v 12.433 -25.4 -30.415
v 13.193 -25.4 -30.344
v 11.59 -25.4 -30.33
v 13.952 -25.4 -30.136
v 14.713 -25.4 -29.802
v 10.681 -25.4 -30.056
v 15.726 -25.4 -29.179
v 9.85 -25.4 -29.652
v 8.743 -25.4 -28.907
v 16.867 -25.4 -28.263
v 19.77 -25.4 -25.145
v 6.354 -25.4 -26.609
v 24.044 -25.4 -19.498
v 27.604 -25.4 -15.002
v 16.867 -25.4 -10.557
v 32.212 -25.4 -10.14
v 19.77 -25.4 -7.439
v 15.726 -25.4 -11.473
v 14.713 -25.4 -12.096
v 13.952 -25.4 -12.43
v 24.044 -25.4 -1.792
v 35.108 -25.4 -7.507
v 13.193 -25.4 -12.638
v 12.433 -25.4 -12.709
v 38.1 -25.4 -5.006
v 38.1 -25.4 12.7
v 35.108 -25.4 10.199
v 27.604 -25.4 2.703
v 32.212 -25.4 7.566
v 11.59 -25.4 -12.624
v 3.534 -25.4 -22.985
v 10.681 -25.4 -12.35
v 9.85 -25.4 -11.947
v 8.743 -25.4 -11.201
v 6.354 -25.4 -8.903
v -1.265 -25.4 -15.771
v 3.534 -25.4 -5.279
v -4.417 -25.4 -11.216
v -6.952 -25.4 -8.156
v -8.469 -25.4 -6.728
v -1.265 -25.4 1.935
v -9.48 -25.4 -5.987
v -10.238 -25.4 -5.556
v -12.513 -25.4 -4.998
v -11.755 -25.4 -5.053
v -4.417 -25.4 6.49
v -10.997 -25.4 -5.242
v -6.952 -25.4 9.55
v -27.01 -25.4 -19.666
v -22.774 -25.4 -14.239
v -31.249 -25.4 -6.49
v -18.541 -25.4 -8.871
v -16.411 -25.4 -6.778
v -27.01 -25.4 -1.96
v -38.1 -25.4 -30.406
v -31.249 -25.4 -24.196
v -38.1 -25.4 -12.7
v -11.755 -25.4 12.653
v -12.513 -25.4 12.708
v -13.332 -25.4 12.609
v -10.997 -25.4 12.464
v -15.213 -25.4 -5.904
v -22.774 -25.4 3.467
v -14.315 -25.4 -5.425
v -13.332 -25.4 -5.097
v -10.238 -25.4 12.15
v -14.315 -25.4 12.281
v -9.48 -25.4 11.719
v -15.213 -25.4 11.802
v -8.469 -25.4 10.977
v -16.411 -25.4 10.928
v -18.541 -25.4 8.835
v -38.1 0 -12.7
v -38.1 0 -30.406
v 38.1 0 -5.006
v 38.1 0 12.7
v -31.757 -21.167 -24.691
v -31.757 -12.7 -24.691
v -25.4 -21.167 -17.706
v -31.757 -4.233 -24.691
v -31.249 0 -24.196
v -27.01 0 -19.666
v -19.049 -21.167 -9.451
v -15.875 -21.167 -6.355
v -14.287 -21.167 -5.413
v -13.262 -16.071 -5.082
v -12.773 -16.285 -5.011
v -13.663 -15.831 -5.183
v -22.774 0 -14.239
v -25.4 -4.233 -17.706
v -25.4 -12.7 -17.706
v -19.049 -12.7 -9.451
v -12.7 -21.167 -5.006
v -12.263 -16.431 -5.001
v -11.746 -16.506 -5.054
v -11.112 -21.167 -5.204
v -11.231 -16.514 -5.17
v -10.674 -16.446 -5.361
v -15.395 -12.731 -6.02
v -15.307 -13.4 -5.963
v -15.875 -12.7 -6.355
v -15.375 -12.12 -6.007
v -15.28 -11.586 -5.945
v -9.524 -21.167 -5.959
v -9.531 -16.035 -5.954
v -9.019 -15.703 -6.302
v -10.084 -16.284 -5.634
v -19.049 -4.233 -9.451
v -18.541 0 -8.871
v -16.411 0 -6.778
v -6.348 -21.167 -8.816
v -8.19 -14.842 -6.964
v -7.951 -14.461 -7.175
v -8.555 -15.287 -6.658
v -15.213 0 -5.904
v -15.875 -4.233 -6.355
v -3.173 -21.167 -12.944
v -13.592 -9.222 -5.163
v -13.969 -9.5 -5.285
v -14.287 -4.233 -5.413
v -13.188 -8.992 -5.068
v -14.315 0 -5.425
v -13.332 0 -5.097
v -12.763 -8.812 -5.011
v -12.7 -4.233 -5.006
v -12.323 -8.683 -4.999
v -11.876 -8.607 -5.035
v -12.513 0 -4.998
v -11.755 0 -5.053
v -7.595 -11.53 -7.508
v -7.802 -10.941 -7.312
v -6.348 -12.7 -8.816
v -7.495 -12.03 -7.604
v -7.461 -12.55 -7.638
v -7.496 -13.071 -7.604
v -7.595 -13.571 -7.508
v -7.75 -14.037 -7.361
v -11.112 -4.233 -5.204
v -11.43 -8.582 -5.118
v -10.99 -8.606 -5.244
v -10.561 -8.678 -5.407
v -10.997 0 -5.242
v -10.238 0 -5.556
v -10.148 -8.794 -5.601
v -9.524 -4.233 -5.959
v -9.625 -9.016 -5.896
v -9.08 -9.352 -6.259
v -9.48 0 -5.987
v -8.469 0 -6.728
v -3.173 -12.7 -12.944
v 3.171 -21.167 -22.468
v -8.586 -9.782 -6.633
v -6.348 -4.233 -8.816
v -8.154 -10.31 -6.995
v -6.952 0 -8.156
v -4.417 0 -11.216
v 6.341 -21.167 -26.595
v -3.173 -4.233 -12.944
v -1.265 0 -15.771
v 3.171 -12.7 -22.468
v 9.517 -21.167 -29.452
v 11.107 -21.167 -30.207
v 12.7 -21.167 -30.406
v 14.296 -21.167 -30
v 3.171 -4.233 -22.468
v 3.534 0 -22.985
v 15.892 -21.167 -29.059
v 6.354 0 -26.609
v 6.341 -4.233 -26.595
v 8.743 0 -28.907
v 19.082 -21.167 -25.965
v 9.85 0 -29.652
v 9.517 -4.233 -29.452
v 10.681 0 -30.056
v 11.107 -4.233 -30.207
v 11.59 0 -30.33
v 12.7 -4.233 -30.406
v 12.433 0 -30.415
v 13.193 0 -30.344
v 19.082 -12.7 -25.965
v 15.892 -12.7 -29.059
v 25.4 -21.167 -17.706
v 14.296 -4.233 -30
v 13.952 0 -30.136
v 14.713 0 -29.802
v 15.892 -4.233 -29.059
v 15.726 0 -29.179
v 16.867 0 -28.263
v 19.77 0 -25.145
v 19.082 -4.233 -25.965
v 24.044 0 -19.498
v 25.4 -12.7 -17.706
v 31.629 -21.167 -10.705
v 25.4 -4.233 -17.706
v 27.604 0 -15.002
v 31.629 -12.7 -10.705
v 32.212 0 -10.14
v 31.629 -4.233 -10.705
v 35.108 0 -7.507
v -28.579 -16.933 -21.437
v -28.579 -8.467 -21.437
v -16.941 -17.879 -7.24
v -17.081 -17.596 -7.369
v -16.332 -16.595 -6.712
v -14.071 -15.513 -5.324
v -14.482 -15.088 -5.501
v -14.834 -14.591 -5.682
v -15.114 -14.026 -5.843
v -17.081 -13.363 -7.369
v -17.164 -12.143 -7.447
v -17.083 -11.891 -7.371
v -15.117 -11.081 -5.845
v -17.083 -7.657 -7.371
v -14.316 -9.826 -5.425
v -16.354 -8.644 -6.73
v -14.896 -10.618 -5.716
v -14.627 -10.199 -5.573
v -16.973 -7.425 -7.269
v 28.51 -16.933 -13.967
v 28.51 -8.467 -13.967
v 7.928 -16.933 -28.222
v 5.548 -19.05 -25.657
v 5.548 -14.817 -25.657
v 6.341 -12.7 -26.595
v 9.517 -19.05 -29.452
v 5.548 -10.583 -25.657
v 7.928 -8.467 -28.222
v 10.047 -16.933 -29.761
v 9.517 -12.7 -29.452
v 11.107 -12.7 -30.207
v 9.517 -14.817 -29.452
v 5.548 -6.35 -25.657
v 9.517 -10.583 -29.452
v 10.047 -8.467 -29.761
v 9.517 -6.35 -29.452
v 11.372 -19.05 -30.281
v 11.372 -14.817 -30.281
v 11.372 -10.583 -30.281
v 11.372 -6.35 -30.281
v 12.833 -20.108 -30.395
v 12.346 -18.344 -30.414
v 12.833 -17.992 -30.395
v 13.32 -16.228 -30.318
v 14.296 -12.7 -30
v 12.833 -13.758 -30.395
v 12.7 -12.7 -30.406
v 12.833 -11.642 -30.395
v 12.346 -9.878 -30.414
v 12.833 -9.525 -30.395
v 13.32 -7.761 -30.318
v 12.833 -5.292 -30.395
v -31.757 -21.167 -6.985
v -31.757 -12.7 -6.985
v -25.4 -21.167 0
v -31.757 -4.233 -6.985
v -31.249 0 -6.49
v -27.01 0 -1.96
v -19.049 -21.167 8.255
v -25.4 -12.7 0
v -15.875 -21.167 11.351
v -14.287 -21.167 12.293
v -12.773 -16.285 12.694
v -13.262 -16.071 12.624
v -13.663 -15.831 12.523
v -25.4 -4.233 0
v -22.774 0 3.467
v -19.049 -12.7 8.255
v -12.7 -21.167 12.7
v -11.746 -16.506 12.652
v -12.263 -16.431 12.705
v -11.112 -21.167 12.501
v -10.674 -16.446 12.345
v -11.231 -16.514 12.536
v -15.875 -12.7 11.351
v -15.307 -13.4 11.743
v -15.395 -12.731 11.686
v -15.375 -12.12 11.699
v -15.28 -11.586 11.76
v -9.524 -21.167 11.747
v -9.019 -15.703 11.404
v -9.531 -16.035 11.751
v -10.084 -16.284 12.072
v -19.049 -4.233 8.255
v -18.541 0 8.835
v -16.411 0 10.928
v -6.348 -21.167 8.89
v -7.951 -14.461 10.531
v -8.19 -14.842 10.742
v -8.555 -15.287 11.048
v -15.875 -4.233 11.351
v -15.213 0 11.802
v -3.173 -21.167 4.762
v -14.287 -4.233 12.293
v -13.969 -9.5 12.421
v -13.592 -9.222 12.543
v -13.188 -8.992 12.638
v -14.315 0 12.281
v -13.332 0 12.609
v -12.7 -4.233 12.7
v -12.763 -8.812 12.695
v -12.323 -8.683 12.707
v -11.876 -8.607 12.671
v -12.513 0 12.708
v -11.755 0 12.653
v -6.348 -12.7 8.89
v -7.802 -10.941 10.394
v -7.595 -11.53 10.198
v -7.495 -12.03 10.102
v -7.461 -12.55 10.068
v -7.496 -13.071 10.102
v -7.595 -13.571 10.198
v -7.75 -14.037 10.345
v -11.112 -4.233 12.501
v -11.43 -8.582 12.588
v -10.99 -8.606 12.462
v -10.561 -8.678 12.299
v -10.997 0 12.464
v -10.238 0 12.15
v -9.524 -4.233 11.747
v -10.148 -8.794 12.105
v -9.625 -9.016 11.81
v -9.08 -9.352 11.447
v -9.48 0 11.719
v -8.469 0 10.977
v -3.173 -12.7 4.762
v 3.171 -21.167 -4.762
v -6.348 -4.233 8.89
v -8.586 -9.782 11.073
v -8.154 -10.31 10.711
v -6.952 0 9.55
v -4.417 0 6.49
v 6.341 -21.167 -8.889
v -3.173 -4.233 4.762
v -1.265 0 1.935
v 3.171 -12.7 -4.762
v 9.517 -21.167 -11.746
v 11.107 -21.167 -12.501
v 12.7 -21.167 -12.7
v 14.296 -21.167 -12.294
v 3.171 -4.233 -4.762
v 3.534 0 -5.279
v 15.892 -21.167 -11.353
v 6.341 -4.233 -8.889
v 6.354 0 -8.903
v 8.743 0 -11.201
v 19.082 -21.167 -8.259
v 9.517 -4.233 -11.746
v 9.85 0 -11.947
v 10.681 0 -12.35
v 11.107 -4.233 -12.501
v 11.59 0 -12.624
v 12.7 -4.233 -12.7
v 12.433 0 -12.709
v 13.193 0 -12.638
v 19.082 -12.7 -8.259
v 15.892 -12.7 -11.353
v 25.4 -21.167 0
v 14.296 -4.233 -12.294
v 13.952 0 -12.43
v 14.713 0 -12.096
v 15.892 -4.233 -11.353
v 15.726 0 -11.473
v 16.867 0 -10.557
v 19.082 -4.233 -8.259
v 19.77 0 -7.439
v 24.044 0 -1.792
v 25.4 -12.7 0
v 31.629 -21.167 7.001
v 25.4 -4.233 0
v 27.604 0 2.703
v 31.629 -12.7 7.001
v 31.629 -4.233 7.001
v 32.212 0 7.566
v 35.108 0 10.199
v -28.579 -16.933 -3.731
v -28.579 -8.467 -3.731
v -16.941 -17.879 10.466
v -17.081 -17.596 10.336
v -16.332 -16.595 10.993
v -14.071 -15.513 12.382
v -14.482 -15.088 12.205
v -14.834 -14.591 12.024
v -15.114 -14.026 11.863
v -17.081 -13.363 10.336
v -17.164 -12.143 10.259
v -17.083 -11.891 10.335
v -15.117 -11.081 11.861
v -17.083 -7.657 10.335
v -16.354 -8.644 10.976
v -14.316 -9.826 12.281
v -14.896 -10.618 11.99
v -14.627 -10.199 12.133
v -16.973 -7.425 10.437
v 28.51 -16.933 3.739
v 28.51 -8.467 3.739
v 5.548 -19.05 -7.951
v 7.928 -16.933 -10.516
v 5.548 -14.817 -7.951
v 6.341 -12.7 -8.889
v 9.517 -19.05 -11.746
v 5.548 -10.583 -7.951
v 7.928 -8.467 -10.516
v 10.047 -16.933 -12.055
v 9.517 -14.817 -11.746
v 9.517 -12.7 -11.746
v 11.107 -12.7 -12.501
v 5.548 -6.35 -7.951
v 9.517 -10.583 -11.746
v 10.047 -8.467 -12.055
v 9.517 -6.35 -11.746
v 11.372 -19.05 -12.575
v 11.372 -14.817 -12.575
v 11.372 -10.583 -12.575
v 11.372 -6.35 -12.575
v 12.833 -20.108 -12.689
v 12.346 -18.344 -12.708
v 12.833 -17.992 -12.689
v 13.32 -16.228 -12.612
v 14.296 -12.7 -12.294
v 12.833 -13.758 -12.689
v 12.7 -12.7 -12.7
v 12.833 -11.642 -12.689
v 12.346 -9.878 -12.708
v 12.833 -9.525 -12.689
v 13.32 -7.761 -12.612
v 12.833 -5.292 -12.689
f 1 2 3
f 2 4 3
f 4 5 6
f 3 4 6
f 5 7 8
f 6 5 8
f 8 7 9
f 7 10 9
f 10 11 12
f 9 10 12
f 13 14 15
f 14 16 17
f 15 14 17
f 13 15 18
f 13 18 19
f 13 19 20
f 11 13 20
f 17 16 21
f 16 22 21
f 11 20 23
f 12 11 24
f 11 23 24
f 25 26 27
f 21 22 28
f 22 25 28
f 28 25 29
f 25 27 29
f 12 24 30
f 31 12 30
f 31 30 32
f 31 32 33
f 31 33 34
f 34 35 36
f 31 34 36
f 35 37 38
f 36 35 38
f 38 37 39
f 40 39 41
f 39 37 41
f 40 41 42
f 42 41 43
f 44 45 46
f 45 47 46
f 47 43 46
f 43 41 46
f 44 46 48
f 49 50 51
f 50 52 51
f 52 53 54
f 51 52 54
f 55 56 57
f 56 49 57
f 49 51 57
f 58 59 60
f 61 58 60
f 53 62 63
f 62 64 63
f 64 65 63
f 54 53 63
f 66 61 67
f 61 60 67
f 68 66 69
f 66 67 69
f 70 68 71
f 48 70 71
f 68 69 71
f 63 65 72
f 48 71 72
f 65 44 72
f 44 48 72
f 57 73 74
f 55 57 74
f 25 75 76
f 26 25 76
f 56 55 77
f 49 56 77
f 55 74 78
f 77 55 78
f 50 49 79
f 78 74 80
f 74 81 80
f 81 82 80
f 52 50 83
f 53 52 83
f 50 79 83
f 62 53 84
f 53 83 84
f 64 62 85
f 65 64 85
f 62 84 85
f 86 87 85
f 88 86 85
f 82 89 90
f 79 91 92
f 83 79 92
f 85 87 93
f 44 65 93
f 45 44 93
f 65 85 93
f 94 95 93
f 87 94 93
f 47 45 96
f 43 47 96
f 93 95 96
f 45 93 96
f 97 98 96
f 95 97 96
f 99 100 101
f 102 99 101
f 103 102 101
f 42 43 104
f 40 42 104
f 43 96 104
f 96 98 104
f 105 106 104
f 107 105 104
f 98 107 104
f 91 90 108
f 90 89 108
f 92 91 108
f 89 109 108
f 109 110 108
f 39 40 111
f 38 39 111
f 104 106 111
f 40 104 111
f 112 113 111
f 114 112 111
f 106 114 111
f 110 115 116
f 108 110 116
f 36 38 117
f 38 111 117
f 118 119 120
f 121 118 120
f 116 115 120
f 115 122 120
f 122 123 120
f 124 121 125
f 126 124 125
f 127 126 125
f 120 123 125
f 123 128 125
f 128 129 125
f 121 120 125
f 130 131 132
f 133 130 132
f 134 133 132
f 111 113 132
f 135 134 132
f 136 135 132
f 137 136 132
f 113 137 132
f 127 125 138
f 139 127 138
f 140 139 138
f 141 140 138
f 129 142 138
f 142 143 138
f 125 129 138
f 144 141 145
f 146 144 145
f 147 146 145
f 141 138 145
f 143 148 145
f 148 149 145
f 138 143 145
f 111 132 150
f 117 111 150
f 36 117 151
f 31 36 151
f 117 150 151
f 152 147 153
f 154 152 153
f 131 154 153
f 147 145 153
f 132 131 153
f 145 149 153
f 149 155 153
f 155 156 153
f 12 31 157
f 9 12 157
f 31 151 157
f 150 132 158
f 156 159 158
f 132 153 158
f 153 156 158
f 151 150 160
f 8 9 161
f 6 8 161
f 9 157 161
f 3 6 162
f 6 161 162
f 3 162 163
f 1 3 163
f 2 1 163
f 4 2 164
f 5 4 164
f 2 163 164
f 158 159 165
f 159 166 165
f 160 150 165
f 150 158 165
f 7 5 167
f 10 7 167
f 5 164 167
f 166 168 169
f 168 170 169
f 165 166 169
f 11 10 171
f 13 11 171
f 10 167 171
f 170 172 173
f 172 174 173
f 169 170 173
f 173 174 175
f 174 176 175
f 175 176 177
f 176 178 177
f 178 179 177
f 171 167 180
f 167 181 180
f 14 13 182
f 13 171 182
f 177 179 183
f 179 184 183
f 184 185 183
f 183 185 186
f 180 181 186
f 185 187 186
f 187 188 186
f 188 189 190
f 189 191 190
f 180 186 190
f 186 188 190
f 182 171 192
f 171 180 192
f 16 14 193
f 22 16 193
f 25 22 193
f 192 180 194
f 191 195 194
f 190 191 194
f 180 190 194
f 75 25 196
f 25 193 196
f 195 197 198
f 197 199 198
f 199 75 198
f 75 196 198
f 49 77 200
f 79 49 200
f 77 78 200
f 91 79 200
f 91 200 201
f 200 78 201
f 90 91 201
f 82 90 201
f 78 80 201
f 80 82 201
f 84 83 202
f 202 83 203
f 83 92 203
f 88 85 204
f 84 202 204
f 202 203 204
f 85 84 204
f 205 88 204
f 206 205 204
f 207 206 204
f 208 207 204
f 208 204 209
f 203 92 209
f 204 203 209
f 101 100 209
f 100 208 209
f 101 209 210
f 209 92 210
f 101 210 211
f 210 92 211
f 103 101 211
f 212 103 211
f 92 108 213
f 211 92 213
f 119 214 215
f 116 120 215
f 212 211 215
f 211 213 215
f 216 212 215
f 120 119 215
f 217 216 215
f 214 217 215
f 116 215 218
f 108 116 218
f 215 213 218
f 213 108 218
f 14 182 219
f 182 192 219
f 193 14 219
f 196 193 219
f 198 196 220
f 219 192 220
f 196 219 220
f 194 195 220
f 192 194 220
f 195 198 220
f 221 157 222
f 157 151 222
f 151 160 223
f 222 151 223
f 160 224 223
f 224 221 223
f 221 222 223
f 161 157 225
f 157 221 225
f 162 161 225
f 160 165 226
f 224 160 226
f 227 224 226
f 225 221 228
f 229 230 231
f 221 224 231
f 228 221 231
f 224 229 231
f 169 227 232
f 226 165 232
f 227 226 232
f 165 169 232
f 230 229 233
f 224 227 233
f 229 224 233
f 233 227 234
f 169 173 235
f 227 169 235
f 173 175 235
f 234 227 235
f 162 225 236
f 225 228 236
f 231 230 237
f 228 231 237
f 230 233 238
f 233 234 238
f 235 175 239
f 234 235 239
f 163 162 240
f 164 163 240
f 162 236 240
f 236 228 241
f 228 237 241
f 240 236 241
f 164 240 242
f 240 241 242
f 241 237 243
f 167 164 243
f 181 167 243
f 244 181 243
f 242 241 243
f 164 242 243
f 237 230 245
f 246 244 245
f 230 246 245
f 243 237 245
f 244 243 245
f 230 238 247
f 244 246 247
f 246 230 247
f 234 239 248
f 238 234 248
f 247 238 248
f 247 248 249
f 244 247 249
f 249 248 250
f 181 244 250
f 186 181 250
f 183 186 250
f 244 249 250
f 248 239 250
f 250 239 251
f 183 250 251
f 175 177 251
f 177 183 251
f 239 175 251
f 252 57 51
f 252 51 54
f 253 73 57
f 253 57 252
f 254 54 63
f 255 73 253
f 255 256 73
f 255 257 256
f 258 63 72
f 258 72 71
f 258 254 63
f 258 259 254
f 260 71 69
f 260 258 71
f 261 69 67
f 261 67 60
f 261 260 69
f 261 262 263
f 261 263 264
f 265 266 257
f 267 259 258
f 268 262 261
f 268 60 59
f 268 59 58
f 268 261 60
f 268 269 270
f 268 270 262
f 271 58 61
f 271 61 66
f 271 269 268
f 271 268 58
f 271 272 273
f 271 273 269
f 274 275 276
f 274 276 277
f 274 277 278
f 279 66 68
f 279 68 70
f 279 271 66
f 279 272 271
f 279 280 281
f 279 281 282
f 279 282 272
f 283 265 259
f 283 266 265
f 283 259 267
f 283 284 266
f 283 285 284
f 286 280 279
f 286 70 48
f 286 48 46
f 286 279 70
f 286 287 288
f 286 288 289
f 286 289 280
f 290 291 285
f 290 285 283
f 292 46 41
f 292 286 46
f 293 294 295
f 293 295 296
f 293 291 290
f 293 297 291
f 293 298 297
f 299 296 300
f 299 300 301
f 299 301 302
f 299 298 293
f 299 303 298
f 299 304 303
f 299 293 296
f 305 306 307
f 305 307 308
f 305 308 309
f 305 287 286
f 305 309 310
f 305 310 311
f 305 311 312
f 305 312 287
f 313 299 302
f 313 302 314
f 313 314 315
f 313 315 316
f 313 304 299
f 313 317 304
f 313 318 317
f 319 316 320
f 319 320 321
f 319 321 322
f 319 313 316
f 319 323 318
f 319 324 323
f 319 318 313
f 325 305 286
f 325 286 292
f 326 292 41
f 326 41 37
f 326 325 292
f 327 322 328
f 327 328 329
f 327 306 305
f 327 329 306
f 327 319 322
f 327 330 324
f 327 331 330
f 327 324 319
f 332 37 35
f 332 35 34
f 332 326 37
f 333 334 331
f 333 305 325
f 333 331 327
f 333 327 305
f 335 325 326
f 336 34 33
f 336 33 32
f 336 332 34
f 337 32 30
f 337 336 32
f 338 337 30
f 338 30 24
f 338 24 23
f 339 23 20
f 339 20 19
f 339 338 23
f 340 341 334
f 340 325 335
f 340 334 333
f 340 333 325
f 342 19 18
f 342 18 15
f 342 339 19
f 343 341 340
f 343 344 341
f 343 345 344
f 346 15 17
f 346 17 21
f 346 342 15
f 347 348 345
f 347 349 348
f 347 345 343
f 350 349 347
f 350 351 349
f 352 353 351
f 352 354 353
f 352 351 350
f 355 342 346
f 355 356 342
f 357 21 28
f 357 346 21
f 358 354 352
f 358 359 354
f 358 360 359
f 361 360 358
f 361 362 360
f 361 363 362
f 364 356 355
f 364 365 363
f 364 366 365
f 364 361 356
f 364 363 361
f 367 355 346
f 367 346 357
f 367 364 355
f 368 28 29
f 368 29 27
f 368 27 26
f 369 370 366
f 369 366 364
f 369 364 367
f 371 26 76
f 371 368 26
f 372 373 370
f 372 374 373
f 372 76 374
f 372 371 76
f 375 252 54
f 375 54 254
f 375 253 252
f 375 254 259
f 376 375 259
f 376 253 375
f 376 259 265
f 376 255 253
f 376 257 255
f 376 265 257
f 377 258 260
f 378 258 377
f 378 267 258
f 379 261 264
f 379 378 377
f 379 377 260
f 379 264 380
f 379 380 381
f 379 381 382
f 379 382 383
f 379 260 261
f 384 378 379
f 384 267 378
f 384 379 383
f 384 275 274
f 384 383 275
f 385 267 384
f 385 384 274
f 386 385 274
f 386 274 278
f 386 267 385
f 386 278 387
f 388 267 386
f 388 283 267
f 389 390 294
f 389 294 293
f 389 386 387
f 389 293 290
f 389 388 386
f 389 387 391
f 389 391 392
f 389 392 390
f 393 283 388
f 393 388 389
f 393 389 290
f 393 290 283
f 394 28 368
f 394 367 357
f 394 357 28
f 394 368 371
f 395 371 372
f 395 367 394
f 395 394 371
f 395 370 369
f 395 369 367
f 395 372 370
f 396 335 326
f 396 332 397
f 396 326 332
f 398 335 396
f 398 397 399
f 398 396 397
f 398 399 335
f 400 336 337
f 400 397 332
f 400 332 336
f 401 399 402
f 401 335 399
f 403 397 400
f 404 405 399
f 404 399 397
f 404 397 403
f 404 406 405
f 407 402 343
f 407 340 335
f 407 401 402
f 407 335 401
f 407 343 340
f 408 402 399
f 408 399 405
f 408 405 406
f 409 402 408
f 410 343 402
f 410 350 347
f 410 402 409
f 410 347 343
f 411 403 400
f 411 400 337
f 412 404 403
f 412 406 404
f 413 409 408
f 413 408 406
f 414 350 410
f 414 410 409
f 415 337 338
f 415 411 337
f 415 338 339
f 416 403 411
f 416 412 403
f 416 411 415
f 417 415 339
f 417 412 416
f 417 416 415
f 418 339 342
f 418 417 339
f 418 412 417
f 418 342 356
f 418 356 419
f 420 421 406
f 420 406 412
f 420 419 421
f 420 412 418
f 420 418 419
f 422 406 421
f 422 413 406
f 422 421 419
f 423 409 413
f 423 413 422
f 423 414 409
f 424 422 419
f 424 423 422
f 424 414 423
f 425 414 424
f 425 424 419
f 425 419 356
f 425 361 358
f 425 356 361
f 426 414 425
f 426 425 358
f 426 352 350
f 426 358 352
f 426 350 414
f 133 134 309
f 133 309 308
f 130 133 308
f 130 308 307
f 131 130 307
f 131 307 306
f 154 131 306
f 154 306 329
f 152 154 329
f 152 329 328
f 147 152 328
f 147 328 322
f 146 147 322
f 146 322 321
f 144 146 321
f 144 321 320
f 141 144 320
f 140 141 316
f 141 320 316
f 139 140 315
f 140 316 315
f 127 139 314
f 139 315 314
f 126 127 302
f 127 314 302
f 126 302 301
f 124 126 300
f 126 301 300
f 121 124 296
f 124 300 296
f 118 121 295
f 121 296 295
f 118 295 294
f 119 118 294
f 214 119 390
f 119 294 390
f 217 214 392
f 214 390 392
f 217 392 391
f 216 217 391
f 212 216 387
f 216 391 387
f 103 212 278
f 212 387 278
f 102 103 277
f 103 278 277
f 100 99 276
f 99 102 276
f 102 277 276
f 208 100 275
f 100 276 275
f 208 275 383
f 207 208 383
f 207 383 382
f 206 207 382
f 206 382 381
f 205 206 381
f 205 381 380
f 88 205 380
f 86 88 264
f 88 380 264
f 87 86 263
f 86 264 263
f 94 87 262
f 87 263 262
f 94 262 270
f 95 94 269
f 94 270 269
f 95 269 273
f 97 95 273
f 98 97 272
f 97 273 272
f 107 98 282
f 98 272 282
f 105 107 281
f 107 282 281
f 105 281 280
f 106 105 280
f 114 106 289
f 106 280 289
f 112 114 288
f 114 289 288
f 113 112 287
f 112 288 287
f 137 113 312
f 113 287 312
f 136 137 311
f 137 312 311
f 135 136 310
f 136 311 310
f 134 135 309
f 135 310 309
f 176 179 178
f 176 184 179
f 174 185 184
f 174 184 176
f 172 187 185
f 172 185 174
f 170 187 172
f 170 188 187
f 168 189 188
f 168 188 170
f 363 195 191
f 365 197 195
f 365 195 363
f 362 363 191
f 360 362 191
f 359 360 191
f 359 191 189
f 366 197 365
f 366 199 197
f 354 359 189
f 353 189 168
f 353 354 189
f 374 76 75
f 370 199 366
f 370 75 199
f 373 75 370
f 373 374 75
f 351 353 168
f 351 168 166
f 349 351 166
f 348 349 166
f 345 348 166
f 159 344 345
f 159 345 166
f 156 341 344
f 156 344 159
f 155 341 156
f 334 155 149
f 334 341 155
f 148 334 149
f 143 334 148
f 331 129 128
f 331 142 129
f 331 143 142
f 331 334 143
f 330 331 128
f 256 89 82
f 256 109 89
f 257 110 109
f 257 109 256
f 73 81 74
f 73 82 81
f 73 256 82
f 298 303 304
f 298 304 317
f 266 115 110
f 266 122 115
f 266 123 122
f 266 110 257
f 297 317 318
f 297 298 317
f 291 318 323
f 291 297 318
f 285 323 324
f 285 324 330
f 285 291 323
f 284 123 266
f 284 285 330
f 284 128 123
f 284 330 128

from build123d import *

# Parameters (mm, degrees)
F1_DEPTH = 25.4
F2_R     = 3.96875
F3_DEPTH = 25.908


with BuildPart() as f1:
    # F0 (on Front) → F1 (new body)
    with BuildSketch(Plane.XZ):
        with BuildLine():
            add(Edge.make_bspline(
                [(-38.1, -12.7), (-33.882107, -9.031354), (-25.392182, -1.693309), (-12.704204, 19.473612), (0.008999, -0.001138), (12.668207, -19.469058), (25.518173, 1.677371), (33.612126, 9.065506), (38.1, 12.7)],
                knots=[0, 0, 0, 0, 17.960512, 35.921024, 53.881537, 71.842049, 89.802561, 107.763073, 107.763073, 107.763073, 107.763073], degree=3))
            Line((-38.1, -12.7), (-38.1, -30.40595))
            add(Edge.make_bspline(
                [(-38.1, -30.40595), (-33.882107, -26.737304), (-25.392182, -19.399258), (-12.704204, 1.767662), (0.008999, -17.707088), (12.668207, -37.175008), (25.518173, -16.028579), (33.612126, -8.640444), (38.1, -5.00595)],
                knots=[0, 0, 0, 0, 17.960512, 35.921024, 53.881537, 71.842049, 89.802561, 107.763073, 107.763073, 107.763073, 107.763073], degree=3))
            Line((38.1, -5.00595), (38.1, 12.7))
        make_face()
    extrude(amount=F1_DEPTH)

    # F2 (on Top) → F3 (cut, symmetric)
    with BuildSketch(Plane.XY):
        with Locations((-11.43, -12.550292)):
            Circle(F2_R)
    extrude(amount=F3_DEPTH, both=True, mode=Mode.SUBTRACT)


solid = f1.part
